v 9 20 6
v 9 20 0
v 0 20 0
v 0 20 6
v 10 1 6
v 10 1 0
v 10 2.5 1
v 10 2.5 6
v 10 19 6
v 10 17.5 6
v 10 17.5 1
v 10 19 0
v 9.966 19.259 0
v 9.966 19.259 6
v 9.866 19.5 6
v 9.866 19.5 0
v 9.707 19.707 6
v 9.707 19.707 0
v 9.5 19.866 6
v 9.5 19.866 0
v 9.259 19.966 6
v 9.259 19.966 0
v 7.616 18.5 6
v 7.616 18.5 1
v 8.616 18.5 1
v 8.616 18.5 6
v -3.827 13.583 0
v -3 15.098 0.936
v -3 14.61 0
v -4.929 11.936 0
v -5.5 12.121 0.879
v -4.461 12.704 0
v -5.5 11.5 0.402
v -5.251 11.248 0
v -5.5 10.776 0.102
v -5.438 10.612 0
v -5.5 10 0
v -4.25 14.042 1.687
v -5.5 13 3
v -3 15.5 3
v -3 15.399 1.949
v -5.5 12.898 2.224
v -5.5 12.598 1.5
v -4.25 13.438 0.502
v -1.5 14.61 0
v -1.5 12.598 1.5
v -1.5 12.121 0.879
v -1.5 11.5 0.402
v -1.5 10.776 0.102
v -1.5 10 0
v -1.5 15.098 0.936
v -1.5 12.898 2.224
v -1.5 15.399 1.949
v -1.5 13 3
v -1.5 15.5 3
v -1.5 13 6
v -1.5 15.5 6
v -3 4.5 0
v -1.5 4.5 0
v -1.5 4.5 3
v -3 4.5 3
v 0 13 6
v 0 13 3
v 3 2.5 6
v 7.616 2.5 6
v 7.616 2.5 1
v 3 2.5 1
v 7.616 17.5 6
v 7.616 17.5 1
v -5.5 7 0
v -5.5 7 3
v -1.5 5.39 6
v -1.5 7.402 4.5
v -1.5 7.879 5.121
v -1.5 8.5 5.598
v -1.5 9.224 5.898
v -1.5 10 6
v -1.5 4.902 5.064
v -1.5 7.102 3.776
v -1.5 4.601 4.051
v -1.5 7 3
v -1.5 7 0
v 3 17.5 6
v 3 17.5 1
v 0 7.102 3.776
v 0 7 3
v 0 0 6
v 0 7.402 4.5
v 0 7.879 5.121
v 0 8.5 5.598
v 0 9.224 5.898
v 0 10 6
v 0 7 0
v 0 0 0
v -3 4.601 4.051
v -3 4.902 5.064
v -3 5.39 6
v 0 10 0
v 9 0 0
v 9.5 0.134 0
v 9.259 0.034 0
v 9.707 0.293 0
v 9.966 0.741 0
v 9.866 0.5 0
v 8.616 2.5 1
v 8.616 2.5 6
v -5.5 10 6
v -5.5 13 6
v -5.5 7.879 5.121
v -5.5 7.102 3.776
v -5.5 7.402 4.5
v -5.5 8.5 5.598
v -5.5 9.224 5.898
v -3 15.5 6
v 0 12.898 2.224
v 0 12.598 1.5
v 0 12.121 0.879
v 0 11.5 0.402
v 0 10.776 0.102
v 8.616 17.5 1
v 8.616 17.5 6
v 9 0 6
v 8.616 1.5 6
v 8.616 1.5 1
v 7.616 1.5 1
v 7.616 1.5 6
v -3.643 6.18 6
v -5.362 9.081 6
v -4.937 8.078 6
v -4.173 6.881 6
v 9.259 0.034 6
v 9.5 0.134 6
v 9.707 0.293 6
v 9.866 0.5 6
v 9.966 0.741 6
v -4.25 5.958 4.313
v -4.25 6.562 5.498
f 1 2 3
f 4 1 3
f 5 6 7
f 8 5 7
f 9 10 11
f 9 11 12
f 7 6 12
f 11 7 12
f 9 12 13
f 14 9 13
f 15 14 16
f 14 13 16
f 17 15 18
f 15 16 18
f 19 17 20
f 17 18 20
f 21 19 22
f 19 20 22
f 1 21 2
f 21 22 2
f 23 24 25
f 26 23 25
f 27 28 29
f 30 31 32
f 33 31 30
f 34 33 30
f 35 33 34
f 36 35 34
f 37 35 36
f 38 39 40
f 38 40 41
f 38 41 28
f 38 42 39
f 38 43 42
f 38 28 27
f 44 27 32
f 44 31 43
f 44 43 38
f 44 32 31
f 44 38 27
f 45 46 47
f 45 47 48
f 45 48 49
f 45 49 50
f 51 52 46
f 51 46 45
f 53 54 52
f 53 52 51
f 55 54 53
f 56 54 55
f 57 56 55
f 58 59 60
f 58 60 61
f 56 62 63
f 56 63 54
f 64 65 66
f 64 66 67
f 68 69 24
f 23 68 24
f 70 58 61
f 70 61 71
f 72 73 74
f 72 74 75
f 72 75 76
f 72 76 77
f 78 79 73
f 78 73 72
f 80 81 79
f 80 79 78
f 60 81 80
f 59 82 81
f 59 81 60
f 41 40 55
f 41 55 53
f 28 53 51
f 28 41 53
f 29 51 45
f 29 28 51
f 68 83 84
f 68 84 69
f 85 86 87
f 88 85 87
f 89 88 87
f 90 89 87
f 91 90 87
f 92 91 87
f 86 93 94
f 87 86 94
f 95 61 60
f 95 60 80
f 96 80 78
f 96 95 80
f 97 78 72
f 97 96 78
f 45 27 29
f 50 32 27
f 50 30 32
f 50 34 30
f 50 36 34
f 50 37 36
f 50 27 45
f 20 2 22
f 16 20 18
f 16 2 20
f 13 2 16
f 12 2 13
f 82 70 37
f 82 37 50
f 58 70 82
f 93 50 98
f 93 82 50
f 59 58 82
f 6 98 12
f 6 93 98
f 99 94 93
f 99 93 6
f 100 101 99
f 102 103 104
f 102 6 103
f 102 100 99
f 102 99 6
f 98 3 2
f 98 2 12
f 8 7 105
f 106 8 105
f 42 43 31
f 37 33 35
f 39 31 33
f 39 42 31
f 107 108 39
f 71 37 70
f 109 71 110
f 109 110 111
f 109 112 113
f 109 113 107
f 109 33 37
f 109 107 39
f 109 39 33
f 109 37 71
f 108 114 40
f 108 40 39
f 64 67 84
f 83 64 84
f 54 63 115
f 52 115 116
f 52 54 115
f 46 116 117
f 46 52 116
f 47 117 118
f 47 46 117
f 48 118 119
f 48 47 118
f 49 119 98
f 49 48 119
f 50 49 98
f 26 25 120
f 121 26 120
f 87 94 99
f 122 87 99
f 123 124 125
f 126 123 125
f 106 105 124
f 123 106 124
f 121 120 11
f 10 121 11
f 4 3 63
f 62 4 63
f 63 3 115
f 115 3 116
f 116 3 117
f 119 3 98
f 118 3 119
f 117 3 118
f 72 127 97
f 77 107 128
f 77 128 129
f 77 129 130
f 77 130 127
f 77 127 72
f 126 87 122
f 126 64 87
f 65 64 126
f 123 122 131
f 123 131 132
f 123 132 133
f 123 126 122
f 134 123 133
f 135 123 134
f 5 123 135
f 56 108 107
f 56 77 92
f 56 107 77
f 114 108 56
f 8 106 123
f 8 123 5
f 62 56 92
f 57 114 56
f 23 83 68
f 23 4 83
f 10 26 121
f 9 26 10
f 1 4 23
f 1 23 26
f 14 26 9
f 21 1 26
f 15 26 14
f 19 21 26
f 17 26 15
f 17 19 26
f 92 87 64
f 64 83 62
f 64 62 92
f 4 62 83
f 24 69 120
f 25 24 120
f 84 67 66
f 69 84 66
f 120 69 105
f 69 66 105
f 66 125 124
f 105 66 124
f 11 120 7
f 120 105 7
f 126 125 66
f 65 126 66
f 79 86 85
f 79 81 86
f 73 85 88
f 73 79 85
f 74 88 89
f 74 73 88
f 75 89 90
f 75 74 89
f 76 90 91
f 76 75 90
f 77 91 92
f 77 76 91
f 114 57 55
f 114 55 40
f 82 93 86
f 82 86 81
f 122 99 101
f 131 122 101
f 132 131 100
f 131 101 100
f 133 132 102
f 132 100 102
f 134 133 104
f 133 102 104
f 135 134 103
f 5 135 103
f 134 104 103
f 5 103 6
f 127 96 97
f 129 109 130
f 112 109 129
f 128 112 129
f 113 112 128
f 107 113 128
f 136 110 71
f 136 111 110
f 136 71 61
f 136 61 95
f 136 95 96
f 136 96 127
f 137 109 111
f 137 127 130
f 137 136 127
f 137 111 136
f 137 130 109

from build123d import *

# Parameters (mm, degrees)
F1_DEPTH  = 6
F3_DEPTH  = 1
F7_W      = 42.1100177336
F7_H      = 2.7686282992
F7_W_2    = 43.2923636399
F7_H_2    = 2.6041977108
F8_DEPTH  = 25
F10_DEPTH = 3
F12_DEPTH = 3


with BuildPart() as f1:
    # F0 (on Top) → F1 (new body)
    with BuildSketch(Plane.XY):
        with BuildLine():
            Line((0, 7), (0, 0))
            Line((0, 0), (9, 0))
            ThreePointArc((9, 0), (9.7071067812, 0.2928932188), (10, 1))
            Line((10, 1), (10, 2.5))
            Line((10, 2.5), (8.6160635799, 2.5))
            Line((8.6160635799, 2.5), (8.6160635799, 1.5))
            Line((8.6160635799, 1.5), (7.6160635799, 1.5))
            Line((7.6160635799, 1.5), (7.6160635799, 2.5))
            Line((7.6160635799, 2.5), (3, 2.5))
            Line((3, 2.5), (3, 17.5))
            Line((3, 17.5), (7.6160635799, 17.5))
            Line((7.6160635799, 17.5), (7.6160635799, 18.5))
            Line((7.6160635799, 18.5), (8.6160635799, 18.5))
            Line((8.6160635799, 18.5), (8.6160635799, 17.5))
            Line((8.6160635799, 17.5), (10, 17.5))
            Line((10, 17.5), (10, 19))
            ThreePointArc((10, 19), (9.7071067812, 19.7071067812), (9, 20))
            Line((9, 20), (0, 20))
            Line((0, 20), (0, 13))
            Line((0, 13), (0, 7))
        make_face()
    extrude(amount=F1_DEPTH)

    # F2 (on face) → F3 (join)
    with BuildSketch(Plane(origin=(0, 0, 0), x_dir=(1, 0, 0), z_dir=(0, 0, -1))):
        with BuildLine():
            Line((10, -19), (10, -1))
            ThreePointArc((10, -1), (9.7071067812, -0.2928932188), (9, 0))
            Line((9, 0), (0, 0))
            Line((0, 0), (0, -20))
            Line((0, -20), (9, -20))
            ThreePointArc((9, -20), (9.7071067812, -19.7071067812), (10, -19))
        make_face()
    extrude(amount=-F3_DEPTH)

    # F5 (on offset) → F6 (revolve)
    with BuildSketch(Plane(origin=(0, 0, 3), x_dir=(1, 0, 0), z_dir=(0, 0, -1))):
        Polygon((-5.5, -7), (-5.5, -10), (0, -10), (0, -7), (-1.5, -7), (-1.5, -4.5), (-3, -4.5), align=None)
    revolve(axis=Axis((-2.75, 10, 3), (-1, 0, 0)))

    # F7 (on face) → F8 (cut)
    with BuildSketch(Plane(origin=(-5.5, 0, 0), x_dir=(0, -1, 0), z_dir=(-1, 0, 0))):
        with Locations((-5.2348260069, -1.3843141496)):
            Rectangle(F7_W, F7_H)
        with Locations((-5.5655788165, 7.3020988554)):
            Rectangle(F7_W_2, F7_H_2)
    extrude(amount=-F8_DEPTH, mode=Mode.SUBTRACT)

    # F9 (on face) → F10 (join)
    with BuildSketch(Plane(origin=(0, 0, 0), x_dir=(1, 0, 0), z_dir=(0, 0, -1))):
        Polygon((-5.5, -7), (-5.5, -10), (0, -10), (0, -7), (-1.5, -7), (-1.5, -4.5), (-3, -4.5), align=None)
    extrude(amount=-F10_DEPTH)

    # F11 (on face) → F12 (join)
    with BuildSketch(Plane.XY.offset(6)):
        Polygon((-5.5, 13), (-5.5, 10), (0, 10), (0, 13), (-1.5, 13), (-1.5, 15.5), (-3, 15.5), align=None)
    extrude(amount=-F12_DEPTH)


solid = f1.part
